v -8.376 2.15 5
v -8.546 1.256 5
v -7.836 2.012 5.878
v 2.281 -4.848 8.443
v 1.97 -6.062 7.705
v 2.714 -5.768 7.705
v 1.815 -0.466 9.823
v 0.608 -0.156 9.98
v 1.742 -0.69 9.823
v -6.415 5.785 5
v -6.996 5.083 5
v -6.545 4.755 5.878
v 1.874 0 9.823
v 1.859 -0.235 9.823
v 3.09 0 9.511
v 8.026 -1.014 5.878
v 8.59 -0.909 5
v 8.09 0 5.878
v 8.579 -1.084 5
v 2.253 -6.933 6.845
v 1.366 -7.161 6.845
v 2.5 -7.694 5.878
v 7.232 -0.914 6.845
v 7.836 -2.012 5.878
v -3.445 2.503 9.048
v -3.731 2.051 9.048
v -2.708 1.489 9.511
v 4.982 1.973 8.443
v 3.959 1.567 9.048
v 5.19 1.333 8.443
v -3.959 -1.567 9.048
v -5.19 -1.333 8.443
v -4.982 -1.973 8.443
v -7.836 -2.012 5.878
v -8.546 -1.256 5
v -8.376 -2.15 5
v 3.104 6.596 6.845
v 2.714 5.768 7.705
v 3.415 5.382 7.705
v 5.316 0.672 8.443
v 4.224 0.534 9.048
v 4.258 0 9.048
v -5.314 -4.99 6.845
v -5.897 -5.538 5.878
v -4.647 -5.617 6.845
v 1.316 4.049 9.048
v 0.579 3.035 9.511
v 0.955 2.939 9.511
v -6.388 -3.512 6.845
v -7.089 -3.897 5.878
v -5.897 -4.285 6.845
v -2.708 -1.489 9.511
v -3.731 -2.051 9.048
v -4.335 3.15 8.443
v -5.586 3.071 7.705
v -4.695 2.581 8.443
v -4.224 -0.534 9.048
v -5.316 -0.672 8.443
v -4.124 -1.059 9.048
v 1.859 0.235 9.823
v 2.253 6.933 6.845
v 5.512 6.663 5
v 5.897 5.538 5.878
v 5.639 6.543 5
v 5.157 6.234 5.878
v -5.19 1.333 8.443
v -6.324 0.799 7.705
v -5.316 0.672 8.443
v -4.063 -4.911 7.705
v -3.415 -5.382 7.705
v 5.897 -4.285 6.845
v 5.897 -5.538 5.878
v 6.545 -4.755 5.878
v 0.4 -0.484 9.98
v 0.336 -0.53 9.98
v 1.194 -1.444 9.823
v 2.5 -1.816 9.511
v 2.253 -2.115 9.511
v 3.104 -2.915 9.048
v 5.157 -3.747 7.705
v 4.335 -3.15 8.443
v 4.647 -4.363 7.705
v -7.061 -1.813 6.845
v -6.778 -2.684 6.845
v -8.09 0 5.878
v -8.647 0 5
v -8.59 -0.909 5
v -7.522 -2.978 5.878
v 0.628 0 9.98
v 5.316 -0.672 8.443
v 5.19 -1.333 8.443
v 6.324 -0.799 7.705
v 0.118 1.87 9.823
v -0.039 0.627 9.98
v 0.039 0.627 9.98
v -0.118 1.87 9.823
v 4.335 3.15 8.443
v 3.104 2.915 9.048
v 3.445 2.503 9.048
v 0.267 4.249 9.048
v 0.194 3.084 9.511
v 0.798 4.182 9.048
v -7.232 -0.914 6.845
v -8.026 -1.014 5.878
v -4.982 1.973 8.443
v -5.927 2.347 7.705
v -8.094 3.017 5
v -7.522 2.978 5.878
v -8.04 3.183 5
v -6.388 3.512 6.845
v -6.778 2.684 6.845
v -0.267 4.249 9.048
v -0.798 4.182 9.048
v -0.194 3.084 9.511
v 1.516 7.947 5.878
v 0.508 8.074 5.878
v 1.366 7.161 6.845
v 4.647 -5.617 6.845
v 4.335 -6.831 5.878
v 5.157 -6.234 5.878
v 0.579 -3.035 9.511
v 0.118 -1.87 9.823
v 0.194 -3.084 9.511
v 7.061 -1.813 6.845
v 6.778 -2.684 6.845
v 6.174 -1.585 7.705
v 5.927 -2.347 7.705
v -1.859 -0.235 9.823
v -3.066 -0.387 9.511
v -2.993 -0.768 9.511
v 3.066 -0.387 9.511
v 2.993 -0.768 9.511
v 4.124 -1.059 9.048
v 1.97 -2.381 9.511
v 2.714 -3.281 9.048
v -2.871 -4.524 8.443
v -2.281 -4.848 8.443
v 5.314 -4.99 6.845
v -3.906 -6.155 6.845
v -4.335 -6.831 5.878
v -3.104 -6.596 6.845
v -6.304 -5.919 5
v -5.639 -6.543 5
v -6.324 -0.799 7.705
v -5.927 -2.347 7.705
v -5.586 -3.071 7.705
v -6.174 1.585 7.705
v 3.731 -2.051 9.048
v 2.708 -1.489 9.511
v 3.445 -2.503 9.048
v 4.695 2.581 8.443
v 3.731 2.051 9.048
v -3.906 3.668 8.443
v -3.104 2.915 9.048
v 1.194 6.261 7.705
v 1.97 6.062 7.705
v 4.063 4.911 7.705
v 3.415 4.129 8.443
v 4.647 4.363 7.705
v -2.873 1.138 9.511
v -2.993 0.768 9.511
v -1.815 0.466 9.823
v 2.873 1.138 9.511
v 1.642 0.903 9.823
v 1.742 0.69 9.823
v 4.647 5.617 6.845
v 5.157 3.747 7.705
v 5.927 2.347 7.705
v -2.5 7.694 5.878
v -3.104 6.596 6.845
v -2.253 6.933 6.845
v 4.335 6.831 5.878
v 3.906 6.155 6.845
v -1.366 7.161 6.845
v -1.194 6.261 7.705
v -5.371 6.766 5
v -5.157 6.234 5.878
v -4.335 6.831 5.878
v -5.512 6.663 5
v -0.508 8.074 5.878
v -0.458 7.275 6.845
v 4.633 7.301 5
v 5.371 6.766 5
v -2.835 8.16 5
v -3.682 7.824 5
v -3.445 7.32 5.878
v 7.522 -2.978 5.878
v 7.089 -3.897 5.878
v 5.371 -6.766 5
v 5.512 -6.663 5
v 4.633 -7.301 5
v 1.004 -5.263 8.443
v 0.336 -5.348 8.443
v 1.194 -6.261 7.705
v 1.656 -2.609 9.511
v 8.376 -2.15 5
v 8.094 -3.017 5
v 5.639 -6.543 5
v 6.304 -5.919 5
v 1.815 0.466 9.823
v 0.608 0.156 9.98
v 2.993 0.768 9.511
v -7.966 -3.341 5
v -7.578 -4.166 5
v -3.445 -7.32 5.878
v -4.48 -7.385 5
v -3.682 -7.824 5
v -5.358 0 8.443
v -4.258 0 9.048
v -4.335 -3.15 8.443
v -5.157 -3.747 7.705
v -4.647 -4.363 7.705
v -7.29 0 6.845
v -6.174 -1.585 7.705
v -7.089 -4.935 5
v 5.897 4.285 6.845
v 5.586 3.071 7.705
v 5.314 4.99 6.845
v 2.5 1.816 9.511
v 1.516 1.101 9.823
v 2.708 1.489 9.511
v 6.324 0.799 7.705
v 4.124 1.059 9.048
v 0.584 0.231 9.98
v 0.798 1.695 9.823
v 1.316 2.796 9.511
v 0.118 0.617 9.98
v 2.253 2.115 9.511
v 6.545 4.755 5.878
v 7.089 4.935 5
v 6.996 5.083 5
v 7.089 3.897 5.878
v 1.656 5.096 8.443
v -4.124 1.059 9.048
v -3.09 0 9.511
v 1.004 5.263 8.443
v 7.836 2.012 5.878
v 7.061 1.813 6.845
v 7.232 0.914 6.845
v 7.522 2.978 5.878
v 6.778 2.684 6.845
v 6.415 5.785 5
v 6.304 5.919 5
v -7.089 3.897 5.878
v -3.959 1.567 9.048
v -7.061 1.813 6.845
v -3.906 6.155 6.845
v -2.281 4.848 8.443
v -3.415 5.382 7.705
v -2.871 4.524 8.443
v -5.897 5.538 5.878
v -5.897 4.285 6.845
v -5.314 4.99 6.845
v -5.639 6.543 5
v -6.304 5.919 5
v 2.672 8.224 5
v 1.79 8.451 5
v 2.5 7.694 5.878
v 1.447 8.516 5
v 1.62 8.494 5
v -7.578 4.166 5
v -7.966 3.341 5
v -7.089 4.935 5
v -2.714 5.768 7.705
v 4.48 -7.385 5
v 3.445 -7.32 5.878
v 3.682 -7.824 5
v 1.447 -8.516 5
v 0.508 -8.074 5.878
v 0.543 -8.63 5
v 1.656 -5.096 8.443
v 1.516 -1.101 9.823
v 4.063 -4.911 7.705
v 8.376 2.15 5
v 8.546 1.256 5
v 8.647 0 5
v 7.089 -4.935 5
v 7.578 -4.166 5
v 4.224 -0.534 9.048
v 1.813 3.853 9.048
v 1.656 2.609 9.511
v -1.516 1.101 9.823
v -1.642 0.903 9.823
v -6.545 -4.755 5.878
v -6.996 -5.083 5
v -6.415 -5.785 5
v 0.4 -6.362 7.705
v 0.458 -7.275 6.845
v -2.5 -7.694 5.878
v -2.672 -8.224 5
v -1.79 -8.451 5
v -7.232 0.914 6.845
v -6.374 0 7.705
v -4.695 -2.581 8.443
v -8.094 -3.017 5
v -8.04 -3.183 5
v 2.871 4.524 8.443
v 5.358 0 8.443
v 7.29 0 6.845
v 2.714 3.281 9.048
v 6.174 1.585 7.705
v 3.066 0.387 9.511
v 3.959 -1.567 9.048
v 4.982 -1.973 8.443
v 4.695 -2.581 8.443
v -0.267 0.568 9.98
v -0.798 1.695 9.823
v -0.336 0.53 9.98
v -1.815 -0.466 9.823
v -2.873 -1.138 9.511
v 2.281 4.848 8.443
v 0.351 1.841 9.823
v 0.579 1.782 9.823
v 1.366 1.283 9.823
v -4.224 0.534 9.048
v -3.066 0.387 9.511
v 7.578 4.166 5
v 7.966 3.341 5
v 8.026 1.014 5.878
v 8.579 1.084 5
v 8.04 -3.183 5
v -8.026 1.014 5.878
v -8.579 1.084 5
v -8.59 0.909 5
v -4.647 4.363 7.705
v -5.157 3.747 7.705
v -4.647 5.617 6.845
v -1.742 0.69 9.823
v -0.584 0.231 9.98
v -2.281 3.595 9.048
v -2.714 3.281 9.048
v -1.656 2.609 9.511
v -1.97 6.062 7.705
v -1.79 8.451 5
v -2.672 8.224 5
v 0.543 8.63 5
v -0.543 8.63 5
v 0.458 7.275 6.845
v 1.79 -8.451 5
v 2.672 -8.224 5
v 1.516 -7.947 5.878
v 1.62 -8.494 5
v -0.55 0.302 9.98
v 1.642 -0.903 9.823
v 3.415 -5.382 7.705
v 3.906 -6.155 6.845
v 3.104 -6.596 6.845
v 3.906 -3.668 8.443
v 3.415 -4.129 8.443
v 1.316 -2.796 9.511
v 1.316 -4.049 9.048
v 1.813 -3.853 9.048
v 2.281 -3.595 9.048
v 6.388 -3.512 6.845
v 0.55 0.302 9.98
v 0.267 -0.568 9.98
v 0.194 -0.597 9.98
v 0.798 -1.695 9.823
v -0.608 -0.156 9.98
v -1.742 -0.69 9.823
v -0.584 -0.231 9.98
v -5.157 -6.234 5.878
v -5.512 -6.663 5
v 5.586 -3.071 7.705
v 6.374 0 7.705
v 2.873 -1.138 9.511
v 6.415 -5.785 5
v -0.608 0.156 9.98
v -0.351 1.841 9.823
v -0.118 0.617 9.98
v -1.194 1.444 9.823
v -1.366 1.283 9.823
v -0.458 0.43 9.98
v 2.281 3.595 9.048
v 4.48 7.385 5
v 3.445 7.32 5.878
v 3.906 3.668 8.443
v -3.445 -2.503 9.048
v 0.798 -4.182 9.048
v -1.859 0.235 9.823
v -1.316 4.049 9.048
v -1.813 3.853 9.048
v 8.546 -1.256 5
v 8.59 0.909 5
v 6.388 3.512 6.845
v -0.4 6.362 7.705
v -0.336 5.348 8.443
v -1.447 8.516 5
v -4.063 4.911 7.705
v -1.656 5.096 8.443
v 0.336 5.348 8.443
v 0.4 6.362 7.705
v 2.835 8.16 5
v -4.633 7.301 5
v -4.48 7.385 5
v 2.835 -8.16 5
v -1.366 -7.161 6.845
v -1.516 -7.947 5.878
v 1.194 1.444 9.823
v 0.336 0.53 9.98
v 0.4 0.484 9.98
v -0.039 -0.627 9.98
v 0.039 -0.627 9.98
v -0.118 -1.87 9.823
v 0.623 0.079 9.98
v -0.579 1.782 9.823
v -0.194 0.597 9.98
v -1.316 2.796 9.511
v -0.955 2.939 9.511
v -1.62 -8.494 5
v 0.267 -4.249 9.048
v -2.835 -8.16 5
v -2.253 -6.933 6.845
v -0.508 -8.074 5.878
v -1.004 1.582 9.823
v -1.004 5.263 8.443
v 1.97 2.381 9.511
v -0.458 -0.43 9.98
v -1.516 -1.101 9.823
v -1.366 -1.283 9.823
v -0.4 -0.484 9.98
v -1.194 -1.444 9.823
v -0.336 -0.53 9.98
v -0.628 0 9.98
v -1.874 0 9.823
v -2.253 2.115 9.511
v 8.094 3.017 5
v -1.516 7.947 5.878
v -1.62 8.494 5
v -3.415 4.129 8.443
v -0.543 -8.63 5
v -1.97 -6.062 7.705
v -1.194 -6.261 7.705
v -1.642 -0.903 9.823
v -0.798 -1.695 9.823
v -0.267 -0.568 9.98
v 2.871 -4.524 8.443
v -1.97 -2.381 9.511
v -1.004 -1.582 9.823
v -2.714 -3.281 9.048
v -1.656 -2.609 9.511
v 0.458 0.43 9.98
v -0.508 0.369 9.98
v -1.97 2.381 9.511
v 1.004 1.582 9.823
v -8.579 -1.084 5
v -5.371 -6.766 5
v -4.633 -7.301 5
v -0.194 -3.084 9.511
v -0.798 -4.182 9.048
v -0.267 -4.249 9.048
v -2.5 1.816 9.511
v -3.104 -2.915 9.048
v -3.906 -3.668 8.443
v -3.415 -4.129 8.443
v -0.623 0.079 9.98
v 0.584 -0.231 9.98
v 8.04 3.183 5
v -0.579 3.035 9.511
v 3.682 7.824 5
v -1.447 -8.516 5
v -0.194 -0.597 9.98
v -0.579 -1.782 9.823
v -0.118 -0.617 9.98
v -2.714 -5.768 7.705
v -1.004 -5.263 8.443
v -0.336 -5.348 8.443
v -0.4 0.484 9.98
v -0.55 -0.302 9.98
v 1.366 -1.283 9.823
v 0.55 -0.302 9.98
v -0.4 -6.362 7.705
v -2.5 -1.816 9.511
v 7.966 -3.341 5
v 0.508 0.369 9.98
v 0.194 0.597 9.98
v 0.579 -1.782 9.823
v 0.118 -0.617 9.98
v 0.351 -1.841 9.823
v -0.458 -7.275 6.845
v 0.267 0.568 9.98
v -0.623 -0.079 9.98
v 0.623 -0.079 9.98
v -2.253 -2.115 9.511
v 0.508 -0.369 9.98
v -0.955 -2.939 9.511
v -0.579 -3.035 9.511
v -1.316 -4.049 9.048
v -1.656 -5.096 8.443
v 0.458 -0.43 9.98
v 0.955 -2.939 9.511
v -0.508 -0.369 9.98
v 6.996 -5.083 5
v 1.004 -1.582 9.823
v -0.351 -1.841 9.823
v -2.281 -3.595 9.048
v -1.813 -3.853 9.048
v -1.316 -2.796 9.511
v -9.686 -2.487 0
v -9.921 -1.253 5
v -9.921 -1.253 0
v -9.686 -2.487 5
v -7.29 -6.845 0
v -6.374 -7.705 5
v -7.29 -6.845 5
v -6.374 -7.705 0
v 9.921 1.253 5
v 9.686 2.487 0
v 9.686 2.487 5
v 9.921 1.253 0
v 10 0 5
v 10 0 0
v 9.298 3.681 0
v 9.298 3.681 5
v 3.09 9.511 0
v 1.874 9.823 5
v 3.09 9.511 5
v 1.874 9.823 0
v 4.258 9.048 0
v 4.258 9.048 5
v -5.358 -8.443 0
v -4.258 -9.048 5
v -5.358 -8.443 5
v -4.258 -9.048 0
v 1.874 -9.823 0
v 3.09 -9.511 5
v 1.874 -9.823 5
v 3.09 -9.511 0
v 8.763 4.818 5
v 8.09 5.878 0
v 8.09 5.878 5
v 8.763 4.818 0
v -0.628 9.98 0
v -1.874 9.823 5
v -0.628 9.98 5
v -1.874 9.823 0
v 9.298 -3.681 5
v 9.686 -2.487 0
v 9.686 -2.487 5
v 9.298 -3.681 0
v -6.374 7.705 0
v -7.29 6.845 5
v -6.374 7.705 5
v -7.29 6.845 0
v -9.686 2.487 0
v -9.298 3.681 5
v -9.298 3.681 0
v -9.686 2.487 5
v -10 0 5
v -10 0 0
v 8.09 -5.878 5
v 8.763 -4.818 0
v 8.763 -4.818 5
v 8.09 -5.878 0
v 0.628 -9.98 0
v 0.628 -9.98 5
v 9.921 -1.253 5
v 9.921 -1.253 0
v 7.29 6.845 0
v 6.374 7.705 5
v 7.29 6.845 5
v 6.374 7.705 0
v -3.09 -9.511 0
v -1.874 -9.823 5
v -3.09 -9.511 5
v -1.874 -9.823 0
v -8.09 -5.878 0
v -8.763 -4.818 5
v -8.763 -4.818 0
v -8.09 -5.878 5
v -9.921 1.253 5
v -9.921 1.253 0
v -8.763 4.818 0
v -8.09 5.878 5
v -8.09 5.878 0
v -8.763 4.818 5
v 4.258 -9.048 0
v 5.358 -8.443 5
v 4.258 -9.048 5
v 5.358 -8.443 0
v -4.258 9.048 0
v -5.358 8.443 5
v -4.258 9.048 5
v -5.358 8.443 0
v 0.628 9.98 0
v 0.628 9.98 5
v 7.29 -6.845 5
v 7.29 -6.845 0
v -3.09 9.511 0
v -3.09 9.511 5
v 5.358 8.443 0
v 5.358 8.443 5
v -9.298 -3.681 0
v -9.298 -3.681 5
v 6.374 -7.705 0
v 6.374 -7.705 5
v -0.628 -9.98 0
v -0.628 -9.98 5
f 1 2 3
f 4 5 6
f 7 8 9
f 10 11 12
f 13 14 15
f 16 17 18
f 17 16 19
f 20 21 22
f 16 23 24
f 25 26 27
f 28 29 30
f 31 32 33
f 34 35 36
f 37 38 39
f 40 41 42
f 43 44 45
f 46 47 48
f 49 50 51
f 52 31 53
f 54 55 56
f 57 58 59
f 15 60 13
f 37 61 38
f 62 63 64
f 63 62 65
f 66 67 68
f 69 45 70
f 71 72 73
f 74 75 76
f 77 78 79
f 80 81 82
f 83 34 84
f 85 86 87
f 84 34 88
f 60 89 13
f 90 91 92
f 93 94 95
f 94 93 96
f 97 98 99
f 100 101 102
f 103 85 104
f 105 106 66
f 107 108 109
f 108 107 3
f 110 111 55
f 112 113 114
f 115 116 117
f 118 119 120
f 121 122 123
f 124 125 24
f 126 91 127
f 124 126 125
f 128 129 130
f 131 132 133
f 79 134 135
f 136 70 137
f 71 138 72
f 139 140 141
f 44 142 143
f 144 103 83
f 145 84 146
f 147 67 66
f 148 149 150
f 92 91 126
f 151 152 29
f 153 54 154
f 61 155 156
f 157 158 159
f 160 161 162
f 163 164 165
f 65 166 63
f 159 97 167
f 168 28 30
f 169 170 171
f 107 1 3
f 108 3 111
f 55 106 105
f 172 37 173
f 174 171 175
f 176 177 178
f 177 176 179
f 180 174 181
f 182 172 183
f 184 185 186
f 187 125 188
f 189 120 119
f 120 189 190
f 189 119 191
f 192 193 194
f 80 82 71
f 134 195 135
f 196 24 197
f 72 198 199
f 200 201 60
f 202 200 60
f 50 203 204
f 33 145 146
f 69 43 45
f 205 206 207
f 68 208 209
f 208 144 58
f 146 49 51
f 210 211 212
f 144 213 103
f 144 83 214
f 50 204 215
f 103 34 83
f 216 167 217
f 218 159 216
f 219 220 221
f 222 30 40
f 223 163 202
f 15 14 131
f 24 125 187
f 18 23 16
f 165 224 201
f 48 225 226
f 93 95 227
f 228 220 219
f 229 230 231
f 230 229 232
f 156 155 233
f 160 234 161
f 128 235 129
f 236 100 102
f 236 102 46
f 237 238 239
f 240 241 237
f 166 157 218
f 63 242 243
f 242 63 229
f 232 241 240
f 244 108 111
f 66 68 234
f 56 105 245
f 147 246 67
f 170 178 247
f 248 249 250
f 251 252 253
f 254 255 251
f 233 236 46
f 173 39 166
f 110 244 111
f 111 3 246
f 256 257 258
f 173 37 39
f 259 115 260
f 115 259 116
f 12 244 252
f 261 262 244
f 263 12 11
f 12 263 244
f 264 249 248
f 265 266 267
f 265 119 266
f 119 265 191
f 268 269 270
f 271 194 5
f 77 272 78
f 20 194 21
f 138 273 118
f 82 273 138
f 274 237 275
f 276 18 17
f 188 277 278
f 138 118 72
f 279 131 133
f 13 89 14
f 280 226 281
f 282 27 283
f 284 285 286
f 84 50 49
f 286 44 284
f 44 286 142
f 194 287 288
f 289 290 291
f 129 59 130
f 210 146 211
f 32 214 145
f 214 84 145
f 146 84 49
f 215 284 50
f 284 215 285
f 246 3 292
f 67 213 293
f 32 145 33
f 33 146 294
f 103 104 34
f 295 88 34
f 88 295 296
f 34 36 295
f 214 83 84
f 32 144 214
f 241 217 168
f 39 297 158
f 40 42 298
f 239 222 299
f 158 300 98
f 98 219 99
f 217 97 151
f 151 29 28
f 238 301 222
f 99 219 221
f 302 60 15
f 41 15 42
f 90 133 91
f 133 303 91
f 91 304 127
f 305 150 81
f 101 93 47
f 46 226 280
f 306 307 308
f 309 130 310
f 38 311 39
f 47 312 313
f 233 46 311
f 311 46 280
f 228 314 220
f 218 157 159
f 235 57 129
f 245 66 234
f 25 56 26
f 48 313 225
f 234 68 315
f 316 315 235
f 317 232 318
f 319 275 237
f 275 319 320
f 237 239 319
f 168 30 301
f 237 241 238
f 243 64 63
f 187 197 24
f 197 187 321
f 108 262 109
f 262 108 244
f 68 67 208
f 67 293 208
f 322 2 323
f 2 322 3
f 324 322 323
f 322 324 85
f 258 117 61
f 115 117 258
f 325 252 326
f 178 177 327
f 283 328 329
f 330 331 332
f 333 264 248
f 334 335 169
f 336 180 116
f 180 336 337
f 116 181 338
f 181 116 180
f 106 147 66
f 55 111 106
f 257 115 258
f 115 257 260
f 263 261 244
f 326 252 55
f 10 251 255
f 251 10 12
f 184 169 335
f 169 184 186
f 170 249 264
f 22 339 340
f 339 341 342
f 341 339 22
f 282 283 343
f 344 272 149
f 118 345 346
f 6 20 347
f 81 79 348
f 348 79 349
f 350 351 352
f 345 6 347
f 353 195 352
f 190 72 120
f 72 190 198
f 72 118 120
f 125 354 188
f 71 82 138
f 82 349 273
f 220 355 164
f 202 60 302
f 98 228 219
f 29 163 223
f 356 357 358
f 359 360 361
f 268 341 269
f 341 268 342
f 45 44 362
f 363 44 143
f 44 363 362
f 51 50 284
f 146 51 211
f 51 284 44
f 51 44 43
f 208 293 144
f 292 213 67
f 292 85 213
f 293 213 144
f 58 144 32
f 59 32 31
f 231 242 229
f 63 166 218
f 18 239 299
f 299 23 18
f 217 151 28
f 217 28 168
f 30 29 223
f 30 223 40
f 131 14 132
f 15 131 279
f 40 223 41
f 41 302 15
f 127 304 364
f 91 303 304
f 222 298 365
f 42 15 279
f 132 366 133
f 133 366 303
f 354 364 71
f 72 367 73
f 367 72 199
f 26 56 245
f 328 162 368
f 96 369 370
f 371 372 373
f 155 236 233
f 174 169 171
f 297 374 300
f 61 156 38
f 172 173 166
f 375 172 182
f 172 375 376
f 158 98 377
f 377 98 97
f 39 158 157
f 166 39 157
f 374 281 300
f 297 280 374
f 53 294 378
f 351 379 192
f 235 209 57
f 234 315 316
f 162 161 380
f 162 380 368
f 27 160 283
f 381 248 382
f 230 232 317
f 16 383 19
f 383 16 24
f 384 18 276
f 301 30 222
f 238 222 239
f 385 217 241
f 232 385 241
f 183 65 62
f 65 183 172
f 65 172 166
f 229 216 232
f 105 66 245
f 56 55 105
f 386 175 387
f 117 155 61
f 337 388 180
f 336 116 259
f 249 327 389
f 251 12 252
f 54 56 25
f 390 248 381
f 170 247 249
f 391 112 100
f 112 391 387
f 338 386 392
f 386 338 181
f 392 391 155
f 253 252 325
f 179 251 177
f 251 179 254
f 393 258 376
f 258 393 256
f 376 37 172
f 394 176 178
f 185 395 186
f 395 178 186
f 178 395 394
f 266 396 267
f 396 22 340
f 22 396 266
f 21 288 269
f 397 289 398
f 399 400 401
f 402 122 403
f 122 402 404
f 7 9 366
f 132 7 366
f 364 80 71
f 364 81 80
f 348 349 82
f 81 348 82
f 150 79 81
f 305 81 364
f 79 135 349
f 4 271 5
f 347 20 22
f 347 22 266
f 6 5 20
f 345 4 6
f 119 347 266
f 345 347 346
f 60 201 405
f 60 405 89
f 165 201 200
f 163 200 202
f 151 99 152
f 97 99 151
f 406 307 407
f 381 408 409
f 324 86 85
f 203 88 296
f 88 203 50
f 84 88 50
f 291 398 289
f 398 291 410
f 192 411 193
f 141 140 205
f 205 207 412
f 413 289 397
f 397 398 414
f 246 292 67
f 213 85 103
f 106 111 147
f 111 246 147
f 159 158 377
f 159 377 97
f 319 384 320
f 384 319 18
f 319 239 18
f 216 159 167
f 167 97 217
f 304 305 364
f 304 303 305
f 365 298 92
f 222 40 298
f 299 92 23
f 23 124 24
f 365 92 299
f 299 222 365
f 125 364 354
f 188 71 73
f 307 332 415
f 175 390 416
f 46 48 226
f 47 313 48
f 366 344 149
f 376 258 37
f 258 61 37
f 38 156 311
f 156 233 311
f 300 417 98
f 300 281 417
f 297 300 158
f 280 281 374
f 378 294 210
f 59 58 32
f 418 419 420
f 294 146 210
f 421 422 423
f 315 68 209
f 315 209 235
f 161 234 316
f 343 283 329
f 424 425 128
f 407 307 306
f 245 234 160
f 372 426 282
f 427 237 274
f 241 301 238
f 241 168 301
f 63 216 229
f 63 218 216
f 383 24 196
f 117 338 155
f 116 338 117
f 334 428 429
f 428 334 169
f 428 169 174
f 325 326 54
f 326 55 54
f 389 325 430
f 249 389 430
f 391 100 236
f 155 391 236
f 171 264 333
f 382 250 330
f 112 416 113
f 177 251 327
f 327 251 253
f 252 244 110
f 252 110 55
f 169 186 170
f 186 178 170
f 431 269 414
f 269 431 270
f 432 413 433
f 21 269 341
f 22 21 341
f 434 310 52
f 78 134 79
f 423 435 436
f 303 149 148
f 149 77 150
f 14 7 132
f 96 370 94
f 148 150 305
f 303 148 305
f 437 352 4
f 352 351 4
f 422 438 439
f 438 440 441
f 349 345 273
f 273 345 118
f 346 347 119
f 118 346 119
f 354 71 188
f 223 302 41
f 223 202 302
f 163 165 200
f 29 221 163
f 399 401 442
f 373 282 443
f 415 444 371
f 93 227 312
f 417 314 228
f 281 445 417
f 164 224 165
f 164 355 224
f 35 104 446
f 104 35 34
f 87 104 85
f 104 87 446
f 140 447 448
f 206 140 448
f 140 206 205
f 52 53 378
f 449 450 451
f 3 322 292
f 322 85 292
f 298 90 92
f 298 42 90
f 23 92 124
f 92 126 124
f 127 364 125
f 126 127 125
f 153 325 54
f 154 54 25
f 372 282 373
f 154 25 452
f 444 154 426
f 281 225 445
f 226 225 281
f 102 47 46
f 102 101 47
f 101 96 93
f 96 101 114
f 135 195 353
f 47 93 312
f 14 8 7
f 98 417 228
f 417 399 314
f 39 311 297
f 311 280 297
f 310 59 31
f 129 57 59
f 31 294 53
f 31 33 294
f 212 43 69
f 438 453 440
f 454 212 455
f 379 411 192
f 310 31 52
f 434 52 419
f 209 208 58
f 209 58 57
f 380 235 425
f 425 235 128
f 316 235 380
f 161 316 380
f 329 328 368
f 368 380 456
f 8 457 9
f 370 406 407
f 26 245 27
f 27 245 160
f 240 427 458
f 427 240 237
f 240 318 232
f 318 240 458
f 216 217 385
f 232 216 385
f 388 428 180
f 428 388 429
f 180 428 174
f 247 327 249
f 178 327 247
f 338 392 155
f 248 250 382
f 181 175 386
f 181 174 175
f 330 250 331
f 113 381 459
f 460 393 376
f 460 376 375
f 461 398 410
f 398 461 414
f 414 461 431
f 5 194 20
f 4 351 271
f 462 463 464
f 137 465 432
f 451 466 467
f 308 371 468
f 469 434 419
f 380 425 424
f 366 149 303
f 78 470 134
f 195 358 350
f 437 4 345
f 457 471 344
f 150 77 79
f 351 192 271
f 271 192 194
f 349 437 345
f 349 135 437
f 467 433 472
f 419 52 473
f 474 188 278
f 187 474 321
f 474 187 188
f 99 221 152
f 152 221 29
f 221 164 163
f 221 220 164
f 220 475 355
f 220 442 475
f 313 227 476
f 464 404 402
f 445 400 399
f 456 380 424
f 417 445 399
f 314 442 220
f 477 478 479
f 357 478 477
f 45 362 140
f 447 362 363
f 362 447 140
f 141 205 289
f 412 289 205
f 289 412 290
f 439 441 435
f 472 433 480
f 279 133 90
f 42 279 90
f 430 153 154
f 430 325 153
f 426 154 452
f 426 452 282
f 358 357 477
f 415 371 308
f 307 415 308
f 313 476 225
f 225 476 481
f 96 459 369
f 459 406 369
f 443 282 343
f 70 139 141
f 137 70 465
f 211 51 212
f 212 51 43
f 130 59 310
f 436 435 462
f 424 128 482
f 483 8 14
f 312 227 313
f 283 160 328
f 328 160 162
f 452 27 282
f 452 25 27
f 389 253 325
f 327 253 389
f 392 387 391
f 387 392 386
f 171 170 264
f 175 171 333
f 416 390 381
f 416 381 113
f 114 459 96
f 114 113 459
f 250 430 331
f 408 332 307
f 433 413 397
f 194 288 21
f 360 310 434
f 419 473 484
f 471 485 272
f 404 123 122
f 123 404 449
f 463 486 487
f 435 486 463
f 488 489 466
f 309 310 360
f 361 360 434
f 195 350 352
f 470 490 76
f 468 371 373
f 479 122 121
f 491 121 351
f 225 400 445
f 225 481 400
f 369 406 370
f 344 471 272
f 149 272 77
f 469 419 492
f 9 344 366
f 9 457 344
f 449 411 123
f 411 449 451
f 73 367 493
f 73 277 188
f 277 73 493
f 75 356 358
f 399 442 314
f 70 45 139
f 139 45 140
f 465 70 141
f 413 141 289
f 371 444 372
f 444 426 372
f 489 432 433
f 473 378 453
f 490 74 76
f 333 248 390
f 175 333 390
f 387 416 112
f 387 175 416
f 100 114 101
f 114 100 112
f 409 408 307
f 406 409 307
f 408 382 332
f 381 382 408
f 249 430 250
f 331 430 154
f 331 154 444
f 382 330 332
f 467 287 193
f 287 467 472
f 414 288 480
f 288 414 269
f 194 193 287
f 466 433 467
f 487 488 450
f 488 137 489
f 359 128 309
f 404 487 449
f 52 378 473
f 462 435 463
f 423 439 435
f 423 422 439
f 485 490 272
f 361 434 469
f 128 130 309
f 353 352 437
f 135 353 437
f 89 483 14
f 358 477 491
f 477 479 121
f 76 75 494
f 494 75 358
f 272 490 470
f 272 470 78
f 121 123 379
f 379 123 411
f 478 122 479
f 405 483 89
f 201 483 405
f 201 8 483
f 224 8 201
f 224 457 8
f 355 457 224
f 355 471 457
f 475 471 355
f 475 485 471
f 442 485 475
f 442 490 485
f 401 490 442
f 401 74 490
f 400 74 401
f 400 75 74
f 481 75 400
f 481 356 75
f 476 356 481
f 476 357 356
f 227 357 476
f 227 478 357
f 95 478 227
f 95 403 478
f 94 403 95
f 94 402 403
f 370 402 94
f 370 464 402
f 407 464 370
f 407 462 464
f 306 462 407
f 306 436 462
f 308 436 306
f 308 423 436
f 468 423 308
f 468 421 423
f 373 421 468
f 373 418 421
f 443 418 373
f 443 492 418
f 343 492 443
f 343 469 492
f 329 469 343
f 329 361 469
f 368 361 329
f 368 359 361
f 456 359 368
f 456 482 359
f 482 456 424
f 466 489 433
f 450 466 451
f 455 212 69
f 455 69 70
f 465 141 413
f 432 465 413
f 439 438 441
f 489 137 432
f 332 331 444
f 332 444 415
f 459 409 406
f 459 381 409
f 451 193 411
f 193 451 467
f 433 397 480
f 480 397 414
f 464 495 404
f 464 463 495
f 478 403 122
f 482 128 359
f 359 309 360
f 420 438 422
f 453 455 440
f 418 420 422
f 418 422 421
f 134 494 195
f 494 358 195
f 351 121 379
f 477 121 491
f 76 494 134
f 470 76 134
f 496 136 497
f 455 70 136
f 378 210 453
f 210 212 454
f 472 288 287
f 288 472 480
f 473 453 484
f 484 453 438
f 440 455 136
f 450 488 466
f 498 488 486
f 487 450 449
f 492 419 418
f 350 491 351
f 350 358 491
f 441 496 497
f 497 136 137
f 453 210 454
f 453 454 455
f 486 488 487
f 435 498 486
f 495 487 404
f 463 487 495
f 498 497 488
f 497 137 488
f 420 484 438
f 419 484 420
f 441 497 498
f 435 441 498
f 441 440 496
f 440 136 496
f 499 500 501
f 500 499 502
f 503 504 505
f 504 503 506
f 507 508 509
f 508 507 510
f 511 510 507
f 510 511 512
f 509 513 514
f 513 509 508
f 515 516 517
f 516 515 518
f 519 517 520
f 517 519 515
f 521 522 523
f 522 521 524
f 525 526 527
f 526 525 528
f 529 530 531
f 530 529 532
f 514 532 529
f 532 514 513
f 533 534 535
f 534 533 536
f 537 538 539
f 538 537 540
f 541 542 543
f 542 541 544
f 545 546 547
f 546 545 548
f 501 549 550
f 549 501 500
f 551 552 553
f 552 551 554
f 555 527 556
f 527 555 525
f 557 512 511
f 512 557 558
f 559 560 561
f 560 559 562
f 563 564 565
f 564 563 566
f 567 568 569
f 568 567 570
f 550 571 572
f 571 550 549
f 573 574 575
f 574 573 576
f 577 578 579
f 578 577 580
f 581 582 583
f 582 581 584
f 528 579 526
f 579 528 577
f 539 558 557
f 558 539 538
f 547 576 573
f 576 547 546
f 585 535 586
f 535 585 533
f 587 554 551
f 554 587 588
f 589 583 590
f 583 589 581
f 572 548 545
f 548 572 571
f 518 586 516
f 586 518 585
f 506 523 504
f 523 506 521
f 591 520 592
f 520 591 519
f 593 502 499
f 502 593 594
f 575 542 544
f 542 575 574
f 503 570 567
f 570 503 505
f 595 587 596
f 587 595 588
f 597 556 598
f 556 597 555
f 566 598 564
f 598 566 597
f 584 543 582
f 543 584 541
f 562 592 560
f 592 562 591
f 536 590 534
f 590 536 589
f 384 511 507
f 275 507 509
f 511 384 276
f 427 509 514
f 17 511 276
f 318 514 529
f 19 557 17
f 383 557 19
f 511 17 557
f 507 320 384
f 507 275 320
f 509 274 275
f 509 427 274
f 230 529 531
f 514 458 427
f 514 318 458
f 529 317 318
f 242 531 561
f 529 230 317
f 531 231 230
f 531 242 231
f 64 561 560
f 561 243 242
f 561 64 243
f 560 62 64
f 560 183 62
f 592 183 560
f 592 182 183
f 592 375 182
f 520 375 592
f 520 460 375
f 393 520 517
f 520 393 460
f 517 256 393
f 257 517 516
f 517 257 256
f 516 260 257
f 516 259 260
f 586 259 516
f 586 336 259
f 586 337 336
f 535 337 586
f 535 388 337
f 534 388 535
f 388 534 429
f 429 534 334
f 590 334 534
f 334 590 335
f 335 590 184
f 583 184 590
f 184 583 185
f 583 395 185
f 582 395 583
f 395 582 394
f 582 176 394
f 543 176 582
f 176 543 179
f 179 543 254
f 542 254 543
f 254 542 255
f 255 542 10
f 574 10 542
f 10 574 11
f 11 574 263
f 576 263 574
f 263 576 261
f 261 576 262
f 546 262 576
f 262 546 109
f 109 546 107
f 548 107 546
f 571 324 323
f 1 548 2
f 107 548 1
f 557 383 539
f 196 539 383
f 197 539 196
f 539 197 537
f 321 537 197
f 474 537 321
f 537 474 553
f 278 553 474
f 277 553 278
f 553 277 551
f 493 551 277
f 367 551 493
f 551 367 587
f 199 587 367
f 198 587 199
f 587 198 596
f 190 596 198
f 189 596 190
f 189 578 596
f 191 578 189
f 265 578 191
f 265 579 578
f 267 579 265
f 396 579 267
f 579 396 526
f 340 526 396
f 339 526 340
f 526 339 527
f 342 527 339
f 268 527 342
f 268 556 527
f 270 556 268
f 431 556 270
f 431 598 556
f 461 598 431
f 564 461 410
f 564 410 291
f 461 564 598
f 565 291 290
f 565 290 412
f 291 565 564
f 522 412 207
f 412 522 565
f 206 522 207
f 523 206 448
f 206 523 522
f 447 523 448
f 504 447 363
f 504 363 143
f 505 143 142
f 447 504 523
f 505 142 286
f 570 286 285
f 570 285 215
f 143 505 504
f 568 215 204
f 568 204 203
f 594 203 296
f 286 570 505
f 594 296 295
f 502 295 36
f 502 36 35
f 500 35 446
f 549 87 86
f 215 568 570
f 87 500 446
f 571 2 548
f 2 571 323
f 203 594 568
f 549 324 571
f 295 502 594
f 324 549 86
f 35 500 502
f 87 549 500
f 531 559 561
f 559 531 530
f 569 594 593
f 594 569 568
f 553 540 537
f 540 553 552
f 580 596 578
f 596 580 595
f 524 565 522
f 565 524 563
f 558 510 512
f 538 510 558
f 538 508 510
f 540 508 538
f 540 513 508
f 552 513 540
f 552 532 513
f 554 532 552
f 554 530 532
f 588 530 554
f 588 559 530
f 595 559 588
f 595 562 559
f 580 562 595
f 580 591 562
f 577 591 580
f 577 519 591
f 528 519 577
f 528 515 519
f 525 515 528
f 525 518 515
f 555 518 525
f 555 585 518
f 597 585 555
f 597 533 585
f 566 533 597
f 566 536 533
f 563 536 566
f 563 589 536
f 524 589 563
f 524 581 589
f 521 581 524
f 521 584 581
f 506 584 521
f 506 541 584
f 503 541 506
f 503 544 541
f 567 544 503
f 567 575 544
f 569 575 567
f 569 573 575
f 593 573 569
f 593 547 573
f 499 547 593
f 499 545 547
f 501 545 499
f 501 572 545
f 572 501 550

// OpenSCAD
// Filename : Headlight.scad
// Version  : v1.0
// Modified : 2 Sept 2016
// Author   : Jason Yeo
//////////////////////////////////////
// Basic headlight
//////////////////////////////////////

$fn=50;

headlight();

module headlight(diameter=20)
{  
    //translate([0,0,-diameter/4])
    difference()
    {
        union()
        {
            sphere(d=diameter,true);
            cylinder(diameter/2,diameter/2,diameter/2,true);
        }
        translate([0,0,-diameter/2])cube([diameter,diameter,diameter],true);
    }
}
